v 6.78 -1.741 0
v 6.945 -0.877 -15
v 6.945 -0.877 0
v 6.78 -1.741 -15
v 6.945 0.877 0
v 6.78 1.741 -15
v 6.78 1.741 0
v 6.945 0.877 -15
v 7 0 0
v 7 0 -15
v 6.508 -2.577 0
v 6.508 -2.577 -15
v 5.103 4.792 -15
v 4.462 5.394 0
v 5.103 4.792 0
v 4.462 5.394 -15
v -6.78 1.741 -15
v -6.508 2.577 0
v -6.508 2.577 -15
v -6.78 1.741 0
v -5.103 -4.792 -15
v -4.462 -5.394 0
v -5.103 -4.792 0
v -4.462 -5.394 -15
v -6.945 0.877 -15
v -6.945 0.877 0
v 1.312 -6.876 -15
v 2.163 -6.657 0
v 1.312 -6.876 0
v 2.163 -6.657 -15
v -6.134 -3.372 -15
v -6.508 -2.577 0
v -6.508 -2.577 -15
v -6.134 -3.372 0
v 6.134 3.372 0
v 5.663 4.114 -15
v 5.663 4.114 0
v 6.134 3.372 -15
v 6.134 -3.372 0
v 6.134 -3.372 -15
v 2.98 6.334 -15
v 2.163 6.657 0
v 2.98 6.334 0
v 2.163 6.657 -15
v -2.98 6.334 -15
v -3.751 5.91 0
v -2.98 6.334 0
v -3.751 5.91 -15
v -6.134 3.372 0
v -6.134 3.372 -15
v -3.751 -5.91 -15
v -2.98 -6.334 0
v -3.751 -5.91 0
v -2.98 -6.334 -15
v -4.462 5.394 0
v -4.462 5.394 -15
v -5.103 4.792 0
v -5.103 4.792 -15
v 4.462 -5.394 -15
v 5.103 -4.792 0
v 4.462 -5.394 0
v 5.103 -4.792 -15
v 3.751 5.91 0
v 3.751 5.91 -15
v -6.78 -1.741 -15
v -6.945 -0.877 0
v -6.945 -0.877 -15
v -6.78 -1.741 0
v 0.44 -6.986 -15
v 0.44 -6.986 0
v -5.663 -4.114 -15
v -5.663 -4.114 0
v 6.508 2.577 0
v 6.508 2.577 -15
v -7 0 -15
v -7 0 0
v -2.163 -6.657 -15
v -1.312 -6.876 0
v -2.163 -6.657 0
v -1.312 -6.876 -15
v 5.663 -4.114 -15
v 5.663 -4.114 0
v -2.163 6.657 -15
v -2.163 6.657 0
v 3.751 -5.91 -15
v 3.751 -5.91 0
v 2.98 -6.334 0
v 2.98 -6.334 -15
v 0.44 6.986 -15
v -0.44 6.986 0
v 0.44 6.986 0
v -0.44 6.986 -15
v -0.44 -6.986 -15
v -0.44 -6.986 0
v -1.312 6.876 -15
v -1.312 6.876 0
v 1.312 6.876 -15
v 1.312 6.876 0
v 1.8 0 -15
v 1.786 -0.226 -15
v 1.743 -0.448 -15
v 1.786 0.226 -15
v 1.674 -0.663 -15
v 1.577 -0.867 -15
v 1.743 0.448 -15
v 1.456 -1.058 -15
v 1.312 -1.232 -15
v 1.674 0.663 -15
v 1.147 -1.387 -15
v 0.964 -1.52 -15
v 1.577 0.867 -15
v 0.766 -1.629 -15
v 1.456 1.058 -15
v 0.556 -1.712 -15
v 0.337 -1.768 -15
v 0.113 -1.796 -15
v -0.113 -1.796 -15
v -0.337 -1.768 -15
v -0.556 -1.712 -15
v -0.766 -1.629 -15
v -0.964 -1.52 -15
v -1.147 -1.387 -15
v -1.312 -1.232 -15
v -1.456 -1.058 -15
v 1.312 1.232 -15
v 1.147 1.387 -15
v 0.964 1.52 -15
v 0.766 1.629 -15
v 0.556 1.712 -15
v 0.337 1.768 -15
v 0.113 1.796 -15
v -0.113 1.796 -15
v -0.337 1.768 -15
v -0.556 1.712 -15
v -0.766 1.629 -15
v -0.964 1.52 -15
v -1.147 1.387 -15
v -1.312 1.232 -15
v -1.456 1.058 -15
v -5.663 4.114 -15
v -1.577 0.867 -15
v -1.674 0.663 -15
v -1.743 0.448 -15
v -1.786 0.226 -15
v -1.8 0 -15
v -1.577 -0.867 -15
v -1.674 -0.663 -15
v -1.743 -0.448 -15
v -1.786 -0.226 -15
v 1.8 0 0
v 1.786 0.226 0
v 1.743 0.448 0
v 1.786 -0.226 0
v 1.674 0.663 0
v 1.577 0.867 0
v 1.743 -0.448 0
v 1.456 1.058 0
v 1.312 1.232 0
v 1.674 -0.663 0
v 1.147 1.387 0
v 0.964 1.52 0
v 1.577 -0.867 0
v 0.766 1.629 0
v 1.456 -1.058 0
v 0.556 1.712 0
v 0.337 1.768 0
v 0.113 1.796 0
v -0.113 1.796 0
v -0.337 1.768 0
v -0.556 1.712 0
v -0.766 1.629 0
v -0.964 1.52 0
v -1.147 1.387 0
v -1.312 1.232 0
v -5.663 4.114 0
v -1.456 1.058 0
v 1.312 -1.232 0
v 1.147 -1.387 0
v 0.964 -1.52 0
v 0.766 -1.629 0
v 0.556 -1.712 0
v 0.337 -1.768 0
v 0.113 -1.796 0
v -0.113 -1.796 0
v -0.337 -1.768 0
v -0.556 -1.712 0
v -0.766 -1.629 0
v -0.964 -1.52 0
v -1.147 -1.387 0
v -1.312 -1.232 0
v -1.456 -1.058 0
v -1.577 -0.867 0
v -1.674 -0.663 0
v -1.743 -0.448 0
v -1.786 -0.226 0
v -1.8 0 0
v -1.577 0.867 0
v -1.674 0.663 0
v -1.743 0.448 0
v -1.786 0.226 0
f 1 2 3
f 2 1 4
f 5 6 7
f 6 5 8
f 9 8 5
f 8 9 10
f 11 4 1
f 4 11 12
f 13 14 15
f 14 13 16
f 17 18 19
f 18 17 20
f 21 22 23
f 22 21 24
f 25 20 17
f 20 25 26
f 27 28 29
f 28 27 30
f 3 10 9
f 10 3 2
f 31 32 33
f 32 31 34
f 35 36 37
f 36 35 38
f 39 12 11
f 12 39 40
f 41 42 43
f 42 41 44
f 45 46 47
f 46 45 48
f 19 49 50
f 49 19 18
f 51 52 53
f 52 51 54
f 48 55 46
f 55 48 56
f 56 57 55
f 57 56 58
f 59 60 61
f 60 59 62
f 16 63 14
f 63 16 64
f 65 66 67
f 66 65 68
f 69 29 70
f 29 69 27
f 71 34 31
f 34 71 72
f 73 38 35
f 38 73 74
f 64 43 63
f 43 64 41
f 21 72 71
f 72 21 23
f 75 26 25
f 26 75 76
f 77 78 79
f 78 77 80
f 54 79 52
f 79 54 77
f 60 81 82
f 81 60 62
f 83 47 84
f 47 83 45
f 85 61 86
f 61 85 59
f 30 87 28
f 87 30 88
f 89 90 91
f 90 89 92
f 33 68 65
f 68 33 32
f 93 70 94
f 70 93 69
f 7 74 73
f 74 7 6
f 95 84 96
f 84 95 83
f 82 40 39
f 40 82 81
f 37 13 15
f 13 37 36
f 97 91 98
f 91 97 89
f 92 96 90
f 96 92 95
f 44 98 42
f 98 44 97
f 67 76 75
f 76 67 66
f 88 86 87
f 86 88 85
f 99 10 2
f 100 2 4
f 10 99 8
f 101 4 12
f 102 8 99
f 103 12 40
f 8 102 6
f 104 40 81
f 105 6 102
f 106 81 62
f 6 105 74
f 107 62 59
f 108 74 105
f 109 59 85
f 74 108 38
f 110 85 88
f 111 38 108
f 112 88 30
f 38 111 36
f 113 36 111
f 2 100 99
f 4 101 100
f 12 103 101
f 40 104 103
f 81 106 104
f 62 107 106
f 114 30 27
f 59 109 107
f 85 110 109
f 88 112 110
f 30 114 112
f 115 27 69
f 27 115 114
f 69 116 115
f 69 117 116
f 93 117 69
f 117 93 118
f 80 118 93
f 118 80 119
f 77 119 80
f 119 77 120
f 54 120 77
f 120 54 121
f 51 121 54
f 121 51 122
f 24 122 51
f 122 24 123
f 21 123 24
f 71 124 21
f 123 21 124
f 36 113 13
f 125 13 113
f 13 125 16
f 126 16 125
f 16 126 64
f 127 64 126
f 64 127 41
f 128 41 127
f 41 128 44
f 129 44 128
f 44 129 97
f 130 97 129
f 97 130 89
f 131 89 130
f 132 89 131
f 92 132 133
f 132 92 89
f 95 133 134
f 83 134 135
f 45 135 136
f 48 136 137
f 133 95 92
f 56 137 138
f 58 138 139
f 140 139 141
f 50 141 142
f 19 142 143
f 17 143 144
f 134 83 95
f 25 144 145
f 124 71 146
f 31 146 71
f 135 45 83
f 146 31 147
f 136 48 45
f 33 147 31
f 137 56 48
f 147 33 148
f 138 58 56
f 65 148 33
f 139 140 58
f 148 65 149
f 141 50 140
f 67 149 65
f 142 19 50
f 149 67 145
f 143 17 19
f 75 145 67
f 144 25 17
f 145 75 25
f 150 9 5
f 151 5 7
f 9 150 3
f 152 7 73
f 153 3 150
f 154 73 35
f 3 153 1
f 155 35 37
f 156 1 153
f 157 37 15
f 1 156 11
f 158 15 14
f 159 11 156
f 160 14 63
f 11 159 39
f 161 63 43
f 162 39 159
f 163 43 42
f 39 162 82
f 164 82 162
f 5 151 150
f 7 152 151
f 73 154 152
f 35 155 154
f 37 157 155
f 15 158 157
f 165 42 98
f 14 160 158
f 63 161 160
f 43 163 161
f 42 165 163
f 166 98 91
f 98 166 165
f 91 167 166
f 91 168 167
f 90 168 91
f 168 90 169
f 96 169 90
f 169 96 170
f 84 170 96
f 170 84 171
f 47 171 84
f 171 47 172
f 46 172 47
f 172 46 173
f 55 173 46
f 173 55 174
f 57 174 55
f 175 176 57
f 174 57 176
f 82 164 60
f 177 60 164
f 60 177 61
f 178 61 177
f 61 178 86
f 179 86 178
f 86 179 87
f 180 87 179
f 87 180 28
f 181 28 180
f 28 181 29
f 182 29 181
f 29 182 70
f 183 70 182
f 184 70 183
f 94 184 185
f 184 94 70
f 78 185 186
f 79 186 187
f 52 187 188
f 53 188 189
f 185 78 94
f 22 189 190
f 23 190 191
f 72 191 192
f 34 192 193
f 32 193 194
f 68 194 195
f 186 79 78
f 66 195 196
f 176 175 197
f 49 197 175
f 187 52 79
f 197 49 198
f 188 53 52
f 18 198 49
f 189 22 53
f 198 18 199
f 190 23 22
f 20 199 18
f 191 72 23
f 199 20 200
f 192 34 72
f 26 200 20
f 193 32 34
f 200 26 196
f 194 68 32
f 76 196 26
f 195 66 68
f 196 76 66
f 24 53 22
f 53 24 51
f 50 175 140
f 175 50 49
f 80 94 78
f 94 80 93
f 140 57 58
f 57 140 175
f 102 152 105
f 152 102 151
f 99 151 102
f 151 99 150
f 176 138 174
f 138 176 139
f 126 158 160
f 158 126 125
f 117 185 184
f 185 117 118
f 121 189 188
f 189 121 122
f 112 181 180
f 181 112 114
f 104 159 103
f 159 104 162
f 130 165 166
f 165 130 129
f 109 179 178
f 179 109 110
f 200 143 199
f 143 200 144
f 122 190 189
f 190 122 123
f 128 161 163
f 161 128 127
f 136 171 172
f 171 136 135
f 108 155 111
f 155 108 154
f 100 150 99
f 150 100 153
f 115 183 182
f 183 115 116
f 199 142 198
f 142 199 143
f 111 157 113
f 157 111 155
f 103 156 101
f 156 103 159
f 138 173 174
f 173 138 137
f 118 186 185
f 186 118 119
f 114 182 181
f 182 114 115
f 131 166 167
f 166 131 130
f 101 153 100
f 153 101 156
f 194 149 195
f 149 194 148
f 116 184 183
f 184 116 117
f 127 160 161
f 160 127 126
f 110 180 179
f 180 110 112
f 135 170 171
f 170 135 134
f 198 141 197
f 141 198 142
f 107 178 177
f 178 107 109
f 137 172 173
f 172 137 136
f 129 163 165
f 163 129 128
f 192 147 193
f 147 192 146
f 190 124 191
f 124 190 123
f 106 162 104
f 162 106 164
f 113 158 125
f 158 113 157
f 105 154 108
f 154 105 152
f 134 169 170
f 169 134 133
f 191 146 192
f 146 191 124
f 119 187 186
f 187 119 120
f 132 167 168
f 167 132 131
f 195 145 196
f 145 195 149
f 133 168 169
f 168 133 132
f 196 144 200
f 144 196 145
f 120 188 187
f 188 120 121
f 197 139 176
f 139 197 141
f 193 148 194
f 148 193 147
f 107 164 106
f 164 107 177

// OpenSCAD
$fn = 50;


difference() {
	union() {
		translate(v = [0, 0, -15.0000000000]) {
			cylinder(h = 15, r = 7.0000000000);
		}
		cylinder(h = 0, r = 17.0000000000);
	}
	union() {
		#translate(v = [0, 0, -15]) {
			cylinder(h = 15, r = 1.8000000000);
		}
	}
}
